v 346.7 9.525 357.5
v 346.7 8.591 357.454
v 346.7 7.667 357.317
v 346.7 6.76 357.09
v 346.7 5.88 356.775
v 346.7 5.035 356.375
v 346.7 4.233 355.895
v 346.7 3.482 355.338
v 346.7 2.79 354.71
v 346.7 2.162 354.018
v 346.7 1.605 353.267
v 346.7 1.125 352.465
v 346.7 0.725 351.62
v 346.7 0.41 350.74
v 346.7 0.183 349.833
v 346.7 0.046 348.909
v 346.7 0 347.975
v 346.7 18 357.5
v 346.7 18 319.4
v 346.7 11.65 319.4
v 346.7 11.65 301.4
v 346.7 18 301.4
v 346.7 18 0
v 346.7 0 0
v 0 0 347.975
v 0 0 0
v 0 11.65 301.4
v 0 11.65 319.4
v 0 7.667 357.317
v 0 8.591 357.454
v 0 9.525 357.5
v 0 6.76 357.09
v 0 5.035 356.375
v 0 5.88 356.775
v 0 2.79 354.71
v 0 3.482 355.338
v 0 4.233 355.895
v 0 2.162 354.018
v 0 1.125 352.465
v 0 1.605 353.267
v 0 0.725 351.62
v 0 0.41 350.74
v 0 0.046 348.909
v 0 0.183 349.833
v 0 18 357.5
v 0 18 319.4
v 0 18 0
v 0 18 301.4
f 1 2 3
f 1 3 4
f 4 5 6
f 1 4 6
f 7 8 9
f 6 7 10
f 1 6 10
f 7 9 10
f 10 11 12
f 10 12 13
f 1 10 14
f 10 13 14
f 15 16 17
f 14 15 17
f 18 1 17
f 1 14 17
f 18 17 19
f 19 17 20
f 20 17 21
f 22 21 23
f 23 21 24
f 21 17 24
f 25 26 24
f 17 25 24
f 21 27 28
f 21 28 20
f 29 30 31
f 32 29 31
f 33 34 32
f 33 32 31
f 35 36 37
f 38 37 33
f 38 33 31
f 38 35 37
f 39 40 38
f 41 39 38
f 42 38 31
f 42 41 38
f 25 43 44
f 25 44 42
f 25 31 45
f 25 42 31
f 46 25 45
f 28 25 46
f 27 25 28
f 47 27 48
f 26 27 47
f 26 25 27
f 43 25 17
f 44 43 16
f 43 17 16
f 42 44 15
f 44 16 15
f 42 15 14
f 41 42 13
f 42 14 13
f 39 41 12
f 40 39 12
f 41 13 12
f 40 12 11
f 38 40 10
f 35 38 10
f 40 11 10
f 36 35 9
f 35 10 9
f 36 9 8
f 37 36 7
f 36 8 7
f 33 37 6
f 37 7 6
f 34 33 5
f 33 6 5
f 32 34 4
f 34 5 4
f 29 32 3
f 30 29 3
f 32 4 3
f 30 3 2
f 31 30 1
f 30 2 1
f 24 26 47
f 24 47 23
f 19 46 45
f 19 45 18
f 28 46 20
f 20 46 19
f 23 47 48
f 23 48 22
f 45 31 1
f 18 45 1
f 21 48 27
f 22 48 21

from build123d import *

# Parameters (mm, degrees)
SKETCH1_W           = 346.7
SKETCH1_H           = 357.50000001
BOSS_EXTRUDE1_DEPTH = 18
SKETCH2_W           = 346.7
SKETCH2_H           = 18
CUT_EXTRUDE1_DEPTH  = 6.35
FILLET1_R           = 9.525


with BuildPart() as part:
    # Sketch1 → Boss-Extrude1 (new body)
    with BuildSketch(Plane(origin=(0, 0, 0), x_dir=(1, 0, 0), z_dir=(0, 1, 0))):
        with Locations((173.35, -178.750000005)):
            Rectangle(SKETCH1_W, SKETCH1_H)
    extrude(amount=BOSS_EXTRUDE1_DEPTH)

    # Sketch2 → Cut-Extrude1 (cut)
    with BuildSketch(Plane(origin=(0, 18, 0), x_dir=(1, 0, 0), z_dir=(0, 1, 0))):
        with Locations((173.35, -310.40000001)):
            Rectangle(SKETCH2_W, SKETCH2_H)
    extrude(amount=-CUT_EXTRUDE1_DEPTH, mode=Mode.SUBTRACT)

    # Fillet1
    fillet1_edges = [part.edges().sort_by_distance(p)[0] for p in [
        (173.35, 0, 357.50000001),
    ]]
    fillet(fillet1_edges, radius=FILLET1_R)


solid = part.part
